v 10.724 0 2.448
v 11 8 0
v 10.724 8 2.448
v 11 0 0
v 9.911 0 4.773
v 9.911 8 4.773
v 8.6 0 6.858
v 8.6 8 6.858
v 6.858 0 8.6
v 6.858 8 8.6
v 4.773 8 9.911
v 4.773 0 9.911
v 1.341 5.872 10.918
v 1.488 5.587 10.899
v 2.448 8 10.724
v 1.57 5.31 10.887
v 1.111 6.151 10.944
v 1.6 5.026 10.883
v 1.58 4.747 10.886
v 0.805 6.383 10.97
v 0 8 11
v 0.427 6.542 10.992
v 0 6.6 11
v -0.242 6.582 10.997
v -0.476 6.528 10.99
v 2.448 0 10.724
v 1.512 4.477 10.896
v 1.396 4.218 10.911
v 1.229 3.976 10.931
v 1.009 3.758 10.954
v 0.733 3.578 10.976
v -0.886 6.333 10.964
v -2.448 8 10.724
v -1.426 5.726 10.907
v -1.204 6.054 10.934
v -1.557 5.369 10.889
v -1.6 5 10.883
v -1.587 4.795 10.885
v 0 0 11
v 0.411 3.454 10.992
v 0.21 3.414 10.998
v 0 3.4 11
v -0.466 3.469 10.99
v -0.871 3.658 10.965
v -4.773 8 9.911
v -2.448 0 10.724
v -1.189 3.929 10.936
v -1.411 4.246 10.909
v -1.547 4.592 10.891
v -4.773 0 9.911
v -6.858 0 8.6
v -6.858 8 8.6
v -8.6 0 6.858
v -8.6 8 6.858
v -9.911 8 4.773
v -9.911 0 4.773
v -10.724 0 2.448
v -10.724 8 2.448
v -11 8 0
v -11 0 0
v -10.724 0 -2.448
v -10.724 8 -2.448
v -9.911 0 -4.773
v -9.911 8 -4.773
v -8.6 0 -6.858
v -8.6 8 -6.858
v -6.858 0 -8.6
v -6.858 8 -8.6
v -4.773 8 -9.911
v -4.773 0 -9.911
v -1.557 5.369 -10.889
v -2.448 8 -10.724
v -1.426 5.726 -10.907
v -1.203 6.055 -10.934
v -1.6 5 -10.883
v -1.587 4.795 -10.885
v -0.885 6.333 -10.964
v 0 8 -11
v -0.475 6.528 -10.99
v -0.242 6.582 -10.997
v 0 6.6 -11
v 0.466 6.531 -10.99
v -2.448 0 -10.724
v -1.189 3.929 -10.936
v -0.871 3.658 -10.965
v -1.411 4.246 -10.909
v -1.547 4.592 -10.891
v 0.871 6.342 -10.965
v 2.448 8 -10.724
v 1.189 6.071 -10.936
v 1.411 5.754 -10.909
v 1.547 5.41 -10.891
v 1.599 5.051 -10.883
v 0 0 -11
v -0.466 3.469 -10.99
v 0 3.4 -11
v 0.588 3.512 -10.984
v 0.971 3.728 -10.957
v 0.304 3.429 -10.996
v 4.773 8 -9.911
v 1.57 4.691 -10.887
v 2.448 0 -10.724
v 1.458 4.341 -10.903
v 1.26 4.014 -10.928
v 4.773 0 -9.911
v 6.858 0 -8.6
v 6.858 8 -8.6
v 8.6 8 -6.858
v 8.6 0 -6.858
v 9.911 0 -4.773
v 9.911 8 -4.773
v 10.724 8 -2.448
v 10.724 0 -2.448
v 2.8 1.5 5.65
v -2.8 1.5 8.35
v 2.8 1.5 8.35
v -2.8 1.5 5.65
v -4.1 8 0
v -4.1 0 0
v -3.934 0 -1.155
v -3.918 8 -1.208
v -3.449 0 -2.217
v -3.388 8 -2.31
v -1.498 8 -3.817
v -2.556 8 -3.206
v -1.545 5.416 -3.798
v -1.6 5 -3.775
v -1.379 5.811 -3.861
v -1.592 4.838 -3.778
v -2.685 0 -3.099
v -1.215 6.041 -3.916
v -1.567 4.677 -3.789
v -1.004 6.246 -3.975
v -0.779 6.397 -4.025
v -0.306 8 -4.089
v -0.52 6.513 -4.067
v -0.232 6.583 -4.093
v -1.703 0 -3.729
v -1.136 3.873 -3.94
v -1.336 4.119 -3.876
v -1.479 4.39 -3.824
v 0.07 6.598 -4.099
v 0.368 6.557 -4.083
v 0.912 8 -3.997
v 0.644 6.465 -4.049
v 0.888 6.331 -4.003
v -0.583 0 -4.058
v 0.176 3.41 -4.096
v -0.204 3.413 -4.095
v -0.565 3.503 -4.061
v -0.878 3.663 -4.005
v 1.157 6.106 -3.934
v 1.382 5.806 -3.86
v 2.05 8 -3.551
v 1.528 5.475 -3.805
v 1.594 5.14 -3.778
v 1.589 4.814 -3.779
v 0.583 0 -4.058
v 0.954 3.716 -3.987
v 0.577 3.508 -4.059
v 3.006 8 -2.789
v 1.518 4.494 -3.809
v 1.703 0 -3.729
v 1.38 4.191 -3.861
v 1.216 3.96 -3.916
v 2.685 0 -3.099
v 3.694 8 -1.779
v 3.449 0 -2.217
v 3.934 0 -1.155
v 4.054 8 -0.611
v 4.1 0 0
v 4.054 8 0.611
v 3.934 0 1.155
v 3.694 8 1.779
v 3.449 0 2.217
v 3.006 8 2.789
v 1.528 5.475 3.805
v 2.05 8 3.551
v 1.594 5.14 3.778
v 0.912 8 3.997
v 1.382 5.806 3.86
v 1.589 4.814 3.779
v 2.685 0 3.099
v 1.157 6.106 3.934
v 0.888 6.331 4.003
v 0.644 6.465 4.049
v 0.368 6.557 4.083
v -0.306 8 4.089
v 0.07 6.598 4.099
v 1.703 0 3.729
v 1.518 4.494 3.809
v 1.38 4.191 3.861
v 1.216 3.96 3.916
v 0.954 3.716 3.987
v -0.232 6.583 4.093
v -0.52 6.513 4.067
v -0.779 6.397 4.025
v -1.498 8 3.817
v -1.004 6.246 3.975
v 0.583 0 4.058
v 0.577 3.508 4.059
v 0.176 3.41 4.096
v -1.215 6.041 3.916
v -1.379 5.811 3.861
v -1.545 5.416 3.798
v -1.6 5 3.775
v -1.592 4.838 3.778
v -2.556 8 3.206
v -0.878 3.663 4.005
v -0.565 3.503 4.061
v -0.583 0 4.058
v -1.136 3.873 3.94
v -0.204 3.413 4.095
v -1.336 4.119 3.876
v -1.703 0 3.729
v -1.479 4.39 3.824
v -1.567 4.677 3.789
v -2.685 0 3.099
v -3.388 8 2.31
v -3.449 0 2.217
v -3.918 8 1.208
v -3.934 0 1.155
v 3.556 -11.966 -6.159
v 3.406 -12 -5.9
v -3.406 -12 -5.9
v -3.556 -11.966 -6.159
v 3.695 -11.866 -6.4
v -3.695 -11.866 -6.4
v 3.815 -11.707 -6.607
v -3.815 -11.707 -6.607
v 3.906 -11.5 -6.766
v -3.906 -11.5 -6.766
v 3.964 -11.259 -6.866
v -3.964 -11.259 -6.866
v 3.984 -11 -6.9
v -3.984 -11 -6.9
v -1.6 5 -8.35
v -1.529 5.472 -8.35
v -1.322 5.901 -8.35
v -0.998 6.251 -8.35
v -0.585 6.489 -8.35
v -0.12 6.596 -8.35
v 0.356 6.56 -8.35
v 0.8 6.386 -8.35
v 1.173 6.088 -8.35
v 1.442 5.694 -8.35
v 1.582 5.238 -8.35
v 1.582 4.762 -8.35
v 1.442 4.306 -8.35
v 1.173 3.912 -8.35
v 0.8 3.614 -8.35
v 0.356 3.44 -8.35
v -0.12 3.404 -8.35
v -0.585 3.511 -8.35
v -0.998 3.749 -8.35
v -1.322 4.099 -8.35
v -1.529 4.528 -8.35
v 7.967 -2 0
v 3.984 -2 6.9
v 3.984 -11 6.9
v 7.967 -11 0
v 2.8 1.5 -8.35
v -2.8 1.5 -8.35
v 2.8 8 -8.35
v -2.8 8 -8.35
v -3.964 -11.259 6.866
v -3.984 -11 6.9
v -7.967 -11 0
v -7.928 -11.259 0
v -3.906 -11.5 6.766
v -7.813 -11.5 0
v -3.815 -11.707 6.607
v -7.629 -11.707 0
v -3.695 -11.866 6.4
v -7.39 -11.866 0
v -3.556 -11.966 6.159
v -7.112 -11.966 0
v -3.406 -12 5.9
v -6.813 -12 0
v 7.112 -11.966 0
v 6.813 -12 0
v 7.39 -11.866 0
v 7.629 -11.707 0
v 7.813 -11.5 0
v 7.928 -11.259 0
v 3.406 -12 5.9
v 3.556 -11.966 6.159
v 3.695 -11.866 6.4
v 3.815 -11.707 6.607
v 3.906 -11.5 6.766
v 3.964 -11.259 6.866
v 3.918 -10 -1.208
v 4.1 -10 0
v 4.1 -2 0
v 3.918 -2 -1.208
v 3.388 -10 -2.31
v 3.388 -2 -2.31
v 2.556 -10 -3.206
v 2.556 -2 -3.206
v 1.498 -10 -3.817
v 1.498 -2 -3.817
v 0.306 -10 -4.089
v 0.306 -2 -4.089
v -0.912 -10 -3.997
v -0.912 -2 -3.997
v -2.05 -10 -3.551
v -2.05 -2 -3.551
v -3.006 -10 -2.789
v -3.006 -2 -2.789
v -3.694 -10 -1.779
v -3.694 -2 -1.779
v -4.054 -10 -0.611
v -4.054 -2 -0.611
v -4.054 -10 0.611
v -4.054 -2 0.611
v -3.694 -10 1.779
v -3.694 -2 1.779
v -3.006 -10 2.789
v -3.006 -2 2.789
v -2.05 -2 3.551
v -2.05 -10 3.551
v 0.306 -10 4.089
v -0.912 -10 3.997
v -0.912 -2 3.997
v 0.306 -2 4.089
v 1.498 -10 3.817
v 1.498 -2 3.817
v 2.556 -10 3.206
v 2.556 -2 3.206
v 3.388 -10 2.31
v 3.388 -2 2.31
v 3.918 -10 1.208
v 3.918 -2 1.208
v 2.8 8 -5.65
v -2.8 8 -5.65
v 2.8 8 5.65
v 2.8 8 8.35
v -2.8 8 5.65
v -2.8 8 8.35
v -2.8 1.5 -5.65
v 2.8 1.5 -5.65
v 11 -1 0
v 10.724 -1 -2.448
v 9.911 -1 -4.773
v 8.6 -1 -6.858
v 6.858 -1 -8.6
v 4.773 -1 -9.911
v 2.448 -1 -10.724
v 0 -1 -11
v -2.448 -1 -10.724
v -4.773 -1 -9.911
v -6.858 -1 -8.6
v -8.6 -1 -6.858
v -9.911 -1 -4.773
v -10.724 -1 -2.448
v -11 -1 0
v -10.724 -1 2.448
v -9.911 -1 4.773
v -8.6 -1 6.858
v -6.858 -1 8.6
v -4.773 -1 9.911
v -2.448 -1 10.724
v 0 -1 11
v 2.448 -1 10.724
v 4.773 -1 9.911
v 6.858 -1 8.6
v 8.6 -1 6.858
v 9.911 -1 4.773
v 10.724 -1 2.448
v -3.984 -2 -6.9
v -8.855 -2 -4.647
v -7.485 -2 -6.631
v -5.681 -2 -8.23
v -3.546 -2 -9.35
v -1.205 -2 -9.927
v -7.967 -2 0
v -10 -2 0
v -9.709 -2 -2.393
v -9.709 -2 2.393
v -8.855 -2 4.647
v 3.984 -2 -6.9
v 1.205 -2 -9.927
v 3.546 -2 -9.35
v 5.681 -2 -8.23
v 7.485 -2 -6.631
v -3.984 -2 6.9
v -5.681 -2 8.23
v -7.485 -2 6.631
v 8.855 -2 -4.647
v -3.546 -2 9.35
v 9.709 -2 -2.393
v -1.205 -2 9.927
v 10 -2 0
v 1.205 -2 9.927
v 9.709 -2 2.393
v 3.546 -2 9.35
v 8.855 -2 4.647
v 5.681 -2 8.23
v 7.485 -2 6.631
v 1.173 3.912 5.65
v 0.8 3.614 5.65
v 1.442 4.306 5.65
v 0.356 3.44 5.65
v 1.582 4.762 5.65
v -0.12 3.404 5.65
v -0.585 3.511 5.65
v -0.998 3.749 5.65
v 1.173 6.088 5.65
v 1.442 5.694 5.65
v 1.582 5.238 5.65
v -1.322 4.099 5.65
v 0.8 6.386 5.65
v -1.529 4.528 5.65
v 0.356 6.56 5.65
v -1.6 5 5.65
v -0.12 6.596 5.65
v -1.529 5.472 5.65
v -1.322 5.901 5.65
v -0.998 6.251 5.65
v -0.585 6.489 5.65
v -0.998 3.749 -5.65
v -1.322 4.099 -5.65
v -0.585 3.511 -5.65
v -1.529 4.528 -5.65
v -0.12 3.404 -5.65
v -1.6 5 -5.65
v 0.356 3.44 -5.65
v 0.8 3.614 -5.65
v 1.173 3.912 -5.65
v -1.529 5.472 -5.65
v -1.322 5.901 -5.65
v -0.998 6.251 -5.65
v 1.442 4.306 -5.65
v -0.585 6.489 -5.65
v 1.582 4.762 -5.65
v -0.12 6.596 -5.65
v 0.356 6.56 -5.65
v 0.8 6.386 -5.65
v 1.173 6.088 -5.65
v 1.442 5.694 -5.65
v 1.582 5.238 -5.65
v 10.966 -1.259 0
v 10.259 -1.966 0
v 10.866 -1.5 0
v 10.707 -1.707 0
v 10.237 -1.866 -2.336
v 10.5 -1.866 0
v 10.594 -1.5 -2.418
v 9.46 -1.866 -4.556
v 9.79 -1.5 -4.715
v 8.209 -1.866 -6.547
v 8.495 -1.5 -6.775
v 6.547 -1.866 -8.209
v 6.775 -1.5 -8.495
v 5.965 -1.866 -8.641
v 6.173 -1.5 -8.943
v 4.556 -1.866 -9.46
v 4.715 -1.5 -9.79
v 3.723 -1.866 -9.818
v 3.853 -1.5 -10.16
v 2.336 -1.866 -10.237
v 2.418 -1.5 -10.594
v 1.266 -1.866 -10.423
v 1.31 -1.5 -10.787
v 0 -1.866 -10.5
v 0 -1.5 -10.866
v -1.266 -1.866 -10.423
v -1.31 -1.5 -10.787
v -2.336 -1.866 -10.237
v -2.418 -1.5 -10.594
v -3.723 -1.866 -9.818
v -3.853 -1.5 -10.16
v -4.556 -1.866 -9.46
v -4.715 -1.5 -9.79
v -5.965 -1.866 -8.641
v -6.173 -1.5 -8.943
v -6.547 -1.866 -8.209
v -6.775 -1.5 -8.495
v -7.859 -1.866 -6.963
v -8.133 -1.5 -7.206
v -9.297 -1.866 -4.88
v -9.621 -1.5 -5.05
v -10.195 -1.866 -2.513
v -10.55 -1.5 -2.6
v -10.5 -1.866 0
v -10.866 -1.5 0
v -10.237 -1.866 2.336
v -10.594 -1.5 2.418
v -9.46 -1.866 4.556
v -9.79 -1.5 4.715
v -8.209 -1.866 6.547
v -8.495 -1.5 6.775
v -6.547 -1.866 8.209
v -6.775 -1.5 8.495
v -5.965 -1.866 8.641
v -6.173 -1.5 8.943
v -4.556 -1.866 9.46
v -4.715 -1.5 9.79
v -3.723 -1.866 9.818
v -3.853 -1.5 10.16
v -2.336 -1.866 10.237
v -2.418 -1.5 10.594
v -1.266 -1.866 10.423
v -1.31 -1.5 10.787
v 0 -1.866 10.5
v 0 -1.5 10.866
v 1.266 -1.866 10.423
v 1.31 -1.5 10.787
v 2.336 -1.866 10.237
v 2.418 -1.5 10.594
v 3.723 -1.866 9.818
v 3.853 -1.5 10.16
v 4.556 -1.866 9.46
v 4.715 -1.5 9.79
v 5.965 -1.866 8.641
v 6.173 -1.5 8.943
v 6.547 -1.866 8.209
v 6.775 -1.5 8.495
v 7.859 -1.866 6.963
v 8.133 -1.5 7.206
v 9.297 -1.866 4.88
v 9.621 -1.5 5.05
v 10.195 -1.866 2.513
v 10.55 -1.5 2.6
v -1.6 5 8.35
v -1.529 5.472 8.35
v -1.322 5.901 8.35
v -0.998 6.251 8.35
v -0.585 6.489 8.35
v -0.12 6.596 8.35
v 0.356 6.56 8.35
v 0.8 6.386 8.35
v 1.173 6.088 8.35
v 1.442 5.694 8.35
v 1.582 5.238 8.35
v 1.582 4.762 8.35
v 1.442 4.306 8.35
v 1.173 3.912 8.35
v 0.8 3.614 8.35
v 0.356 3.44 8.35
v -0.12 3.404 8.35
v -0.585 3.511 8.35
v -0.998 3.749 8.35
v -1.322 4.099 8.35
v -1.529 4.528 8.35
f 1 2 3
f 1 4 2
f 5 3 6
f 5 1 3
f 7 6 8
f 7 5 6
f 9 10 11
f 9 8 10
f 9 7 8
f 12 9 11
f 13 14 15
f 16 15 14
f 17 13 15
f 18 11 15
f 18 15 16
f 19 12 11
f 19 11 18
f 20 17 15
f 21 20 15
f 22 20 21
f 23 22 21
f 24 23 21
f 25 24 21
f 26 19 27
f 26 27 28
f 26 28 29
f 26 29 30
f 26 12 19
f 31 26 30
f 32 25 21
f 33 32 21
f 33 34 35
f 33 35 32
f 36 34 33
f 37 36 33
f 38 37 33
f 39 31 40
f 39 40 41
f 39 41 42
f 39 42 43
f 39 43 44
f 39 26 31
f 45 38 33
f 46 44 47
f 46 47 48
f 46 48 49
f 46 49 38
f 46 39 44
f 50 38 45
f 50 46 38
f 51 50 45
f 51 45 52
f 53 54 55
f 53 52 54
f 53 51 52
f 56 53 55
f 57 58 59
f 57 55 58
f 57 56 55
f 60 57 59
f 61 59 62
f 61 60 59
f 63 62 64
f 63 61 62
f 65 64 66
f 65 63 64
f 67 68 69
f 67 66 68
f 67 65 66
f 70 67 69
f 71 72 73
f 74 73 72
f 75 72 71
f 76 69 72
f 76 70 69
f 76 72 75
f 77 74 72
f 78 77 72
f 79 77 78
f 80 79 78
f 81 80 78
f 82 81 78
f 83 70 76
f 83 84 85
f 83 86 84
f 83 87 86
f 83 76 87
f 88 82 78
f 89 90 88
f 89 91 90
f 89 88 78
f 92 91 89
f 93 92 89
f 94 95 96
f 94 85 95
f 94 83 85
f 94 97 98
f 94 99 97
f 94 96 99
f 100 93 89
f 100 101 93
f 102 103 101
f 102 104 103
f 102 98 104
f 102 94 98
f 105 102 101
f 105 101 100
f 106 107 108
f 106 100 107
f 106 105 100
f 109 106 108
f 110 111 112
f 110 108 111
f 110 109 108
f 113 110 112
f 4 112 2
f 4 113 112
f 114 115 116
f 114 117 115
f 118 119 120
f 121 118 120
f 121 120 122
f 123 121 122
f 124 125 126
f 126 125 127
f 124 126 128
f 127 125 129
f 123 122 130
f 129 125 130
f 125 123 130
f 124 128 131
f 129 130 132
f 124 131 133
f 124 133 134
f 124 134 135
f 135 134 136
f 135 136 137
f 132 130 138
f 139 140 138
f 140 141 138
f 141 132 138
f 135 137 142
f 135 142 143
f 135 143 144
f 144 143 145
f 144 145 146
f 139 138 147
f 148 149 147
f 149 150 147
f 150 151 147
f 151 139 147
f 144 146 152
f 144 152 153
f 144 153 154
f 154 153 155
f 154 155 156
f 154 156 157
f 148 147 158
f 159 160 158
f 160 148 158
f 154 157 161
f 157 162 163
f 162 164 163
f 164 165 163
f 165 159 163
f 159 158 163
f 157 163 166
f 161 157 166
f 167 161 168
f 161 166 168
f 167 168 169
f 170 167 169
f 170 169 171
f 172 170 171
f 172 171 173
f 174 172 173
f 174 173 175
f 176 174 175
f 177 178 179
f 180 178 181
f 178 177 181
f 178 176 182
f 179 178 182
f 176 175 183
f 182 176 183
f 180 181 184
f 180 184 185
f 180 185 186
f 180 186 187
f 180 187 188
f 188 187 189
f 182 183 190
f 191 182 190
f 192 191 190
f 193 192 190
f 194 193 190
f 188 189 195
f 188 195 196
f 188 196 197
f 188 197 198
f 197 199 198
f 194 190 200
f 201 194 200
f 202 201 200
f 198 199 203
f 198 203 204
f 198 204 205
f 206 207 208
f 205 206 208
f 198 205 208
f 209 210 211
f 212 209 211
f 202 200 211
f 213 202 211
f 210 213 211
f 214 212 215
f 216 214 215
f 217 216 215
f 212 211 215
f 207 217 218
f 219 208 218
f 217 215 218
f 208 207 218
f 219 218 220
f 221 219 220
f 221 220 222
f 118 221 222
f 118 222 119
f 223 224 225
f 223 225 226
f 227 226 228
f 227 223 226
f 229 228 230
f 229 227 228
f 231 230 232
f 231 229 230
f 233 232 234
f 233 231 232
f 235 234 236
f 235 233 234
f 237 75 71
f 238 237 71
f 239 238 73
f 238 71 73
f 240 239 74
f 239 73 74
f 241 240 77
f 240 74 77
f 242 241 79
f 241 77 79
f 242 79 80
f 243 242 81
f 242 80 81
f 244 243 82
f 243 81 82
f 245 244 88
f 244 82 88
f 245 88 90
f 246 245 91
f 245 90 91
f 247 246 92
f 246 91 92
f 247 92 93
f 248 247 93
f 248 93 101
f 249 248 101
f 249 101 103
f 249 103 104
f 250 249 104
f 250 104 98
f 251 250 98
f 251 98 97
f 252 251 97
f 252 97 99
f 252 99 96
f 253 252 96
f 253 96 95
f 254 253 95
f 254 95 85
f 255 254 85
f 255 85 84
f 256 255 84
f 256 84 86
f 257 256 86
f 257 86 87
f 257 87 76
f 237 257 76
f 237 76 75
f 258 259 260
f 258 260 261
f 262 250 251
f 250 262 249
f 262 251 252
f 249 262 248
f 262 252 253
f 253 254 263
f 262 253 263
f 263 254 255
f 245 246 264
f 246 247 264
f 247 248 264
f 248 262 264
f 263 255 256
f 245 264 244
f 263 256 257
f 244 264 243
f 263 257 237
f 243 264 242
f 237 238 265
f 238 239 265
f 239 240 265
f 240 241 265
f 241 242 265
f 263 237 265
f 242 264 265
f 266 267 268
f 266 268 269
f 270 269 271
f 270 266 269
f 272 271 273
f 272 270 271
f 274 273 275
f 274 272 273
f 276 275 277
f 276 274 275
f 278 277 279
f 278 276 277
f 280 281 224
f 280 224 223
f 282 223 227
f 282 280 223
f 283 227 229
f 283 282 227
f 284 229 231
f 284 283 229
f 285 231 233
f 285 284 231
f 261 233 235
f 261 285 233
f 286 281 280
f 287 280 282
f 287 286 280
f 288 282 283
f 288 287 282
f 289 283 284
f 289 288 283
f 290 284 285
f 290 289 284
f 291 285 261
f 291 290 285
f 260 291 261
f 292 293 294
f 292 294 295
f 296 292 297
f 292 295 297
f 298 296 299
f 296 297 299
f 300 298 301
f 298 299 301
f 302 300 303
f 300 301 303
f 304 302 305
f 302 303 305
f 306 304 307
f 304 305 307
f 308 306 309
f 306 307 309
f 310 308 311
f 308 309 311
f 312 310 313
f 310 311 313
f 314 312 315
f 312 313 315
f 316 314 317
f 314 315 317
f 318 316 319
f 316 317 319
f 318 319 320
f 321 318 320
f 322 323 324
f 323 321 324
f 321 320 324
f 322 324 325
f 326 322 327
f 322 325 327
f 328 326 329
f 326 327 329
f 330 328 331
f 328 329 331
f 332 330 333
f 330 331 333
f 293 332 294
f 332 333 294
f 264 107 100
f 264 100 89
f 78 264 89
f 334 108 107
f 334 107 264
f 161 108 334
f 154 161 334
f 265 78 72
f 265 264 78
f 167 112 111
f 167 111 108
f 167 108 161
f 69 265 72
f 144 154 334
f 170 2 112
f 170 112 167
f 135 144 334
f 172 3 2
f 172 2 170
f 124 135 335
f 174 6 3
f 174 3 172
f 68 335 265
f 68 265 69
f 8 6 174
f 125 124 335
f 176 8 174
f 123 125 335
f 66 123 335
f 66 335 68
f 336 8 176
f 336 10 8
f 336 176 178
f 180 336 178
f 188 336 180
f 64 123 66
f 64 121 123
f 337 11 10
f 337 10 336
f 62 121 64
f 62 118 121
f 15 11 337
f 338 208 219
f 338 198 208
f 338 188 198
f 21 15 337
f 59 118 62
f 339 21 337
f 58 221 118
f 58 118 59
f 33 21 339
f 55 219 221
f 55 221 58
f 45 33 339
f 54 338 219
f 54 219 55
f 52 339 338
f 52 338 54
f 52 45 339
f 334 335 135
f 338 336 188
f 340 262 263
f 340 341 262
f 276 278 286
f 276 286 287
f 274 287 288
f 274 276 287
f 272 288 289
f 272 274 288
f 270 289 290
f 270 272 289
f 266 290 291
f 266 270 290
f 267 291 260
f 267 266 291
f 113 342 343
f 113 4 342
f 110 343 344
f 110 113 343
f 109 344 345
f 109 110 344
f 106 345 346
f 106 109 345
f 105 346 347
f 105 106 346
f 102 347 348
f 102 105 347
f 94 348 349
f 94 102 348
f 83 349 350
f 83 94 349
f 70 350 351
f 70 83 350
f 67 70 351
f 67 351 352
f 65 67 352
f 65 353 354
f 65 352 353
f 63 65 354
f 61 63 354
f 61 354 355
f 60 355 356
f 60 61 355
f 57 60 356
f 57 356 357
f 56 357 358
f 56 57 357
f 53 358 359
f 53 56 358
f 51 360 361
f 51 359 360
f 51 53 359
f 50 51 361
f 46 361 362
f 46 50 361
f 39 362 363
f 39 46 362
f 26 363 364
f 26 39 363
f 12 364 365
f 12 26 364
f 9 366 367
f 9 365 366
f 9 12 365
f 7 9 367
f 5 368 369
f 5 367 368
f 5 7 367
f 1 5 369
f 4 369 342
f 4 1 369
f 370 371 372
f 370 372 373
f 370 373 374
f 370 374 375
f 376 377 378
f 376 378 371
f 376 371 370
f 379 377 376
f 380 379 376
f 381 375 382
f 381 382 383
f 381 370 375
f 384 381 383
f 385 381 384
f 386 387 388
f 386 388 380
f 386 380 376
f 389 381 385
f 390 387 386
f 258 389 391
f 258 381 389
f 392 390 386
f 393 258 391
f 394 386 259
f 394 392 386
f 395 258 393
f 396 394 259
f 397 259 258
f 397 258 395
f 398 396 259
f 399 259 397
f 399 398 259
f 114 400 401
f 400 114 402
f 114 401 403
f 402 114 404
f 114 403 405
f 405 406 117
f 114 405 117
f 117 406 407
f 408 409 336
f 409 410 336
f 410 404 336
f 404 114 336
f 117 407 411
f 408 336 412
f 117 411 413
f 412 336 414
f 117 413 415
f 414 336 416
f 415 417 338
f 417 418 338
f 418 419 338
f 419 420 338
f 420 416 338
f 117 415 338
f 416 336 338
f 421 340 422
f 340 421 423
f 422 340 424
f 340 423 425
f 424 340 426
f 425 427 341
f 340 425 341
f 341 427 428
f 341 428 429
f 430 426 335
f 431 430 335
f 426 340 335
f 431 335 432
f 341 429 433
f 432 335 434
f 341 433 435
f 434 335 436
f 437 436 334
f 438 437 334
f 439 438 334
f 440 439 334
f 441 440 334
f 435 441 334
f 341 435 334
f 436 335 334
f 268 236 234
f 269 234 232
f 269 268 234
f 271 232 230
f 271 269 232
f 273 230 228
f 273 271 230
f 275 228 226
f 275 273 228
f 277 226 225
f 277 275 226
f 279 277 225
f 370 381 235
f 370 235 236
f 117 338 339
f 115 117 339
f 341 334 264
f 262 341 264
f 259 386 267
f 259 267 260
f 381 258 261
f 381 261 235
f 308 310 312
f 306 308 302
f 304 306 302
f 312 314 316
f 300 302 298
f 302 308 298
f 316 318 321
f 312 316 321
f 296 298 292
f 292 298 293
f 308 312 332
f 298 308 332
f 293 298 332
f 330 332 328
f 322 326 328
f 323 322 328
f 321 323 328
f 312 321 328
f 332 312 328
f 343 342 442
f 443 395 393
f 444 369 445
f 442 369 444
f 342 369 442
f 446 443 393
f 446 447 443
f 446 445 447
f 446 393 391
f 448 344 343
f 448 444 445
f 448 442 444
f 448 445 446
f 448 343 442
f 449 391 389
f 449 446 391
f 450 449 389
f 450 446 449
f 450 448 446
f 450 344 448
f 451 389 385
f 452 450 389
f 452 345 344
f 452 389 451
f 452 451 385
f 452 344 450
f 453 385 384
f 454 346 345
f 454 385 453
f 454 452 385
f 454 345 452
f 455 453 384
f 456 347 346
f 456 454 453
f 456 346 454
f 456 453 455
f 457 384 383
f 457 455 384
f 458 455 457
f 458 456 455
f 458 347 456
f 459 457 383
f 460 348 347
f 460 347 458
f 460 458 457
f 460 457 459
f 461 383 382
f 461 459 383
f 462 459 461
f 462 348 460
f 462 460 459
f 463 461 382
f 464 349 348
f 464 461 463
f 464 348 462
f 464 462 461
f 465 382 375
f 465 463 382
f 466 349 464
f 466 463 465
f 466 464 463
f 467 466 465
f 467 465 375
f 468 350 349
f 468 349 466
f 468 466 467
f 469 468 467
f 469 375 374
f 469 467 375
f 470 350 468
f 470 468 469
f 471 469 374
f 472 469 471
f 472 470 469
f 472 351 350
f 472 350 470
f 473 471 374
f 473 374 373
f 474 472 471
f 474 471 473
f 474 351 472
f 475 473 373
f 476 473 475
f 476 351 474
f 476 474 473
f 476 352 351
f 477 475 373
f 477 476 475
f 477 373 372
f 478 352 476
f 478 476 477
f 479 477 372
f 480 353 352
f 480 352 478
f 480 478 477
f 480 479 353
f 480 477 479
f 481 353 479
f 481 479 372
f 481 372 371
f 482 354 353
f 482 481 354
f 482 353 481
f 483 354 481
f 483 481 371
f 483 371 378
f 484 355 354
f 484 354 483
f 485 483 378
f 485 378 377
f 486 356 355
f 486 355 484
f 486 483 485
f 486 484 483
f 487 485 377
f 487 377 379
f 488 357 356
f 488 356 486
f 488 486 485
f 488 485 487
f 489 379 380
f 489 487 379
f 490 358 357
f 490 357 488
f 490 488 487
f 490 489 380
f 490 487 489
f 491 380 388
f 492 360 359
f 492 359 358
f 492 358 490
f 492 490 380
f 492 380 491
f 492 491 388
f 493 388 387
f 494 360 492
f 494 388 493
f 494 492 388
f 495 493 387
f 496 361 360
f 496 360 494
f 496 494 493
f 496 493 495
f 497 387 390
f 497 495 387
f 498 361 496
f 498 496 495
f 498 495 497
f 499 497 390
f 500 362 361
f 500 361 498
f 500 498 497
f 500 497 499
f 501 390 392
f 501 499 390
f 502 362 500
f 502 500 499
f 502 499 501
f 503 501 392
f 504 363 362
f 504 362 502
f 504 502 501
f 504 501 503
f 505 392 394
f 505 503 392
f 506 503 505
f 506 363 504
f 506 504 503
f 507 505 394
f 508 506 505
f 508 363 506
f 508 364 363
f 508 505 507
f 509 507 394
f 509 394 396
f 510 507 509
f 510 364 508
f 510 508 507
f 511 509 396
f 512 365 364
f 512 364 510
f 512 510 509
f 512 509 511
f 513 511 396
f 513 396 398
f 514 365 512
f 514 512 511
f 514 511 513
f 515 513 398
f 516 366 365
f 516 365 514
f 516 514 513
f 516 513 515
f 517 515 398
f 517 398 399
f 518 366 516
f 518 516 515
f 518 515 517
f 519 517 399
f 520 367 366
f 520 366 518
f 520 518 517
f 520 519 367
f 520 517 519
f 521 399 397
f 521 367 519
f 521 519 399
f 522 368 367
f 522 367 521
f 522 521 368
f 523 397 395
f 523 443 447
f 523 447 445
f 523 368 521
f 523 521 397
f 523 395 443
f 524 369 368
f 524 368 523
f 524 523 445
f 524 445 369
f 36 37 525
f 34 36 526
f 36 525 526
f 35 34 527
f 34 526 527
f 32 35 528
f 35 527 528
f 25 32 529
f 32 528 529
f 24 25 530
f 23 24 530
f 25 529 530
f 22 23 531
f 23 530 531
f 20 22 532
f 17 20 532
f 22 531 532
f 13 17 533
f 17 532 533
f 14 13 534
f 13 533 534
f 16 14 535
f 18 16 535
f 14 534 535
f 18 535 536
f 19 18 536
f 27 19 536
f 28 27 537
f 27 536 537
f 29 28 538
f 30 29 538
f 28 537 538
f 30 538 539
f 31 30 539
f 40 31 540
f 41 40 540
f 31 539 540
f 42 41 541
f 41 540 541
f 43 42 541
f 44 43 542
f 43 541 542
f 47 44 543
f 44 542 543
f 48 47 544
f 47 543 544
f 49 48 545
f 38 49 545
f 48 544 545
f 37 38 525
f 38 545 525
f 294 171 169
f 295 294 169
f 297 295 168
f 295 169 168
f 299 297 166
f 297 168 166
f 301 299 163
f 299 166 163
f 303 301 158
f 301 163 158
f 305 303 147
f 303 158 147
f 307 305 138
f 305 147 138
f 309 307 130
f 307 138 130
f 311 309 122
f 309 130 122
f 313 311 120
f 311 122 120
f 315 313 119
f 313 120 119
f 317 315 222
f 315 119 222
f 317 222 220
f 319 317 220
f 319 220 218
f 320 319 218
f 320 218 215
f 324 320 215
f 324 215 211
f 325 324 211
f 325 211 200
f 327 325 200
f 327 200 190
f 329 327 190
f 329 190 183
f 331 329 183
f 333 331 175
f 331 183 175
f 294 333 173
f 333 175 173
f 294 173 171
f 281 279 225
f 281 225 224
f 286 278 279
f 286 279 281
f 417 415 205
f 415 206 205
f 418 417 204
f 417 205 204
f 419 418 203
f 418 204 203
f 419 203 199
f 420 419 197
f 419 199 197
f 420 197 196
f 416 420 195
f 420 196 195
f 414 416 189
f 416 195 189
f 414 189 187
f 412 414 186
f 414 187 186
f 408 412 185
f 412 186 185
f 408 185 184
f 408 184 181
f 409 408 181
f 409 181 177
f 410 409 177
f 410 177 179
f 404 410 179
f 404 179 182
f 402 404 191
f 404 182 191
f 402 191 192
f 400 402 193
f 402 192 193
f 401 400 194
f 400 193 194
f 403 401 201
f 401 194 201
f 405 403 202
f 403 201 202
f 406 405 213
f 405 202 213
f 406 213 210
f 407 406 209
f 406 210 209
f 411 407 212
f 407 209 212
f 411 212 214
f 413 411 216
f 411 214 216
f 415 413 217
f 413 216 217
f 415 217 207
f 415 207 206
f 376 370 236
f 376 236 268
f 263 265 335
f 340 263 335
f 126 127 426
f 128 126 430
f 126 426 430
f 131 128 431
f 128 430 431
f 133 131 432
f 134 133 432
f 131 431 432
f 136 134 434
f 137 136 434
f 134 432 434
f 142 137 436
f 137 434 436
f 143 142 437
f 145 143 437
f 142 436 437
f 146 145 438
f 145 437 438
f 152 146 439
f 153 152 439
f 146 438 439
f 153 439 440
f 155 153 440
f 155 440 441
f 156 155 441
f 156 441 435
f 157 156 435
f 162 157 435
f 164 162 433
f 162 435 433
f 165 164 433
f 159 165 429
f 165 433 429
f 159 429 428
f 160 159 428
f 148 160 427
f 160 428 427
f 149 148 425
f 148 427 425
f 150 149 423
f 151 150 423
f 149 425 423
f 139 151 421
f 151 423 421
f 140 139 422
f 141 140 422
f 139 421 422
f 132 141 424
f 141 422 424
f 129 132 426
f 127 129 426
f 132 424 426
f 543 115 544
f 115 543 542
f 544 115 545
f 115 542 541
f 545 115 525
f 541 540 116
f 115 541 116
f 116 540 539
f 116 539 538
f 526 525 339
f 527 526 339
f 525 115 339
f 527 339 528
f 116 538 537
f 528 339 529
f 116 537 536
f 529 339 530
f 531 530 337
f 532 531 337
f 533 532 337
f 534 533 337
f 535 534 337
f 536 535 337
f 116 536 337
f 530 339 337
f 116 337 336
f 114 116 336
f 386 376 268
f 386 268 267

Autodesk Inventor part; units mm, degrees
ref_plane "YZ Plane" through (0, 0, 0) normal (1, 0, 0) x (0, 1, 0)
ref_plane "XZ Plane" through (0, 0, 0) normal (0, 1, 0) x (-1, 0, 0)
ref_plane "XY Plane" through (0, 0, 0) normal (0, 0, 1) x (1, 0, 0)
sketch "Sketch1" plane through (0, 0, 0) normal (0, 1, 0) x (-1, 0, 0)
  line L0 (12.7017, 0) -> (6.3509, -11)
  line L1 (6.3509, -11) -> (-6.3509, -11)
  line L2 (-6.3509, -11) -> (-12.7017, 0)
  line L3 (-12.7017, 0) -> (-6.3509, 11)
  line L4 (-6.3509, 11) -> (6.3509, 11)
  line L5 (6.3509, 11) -> (12.7017, 0)
  circle A0 centre (0, 0) radius 11
  circle A1 centre (0, 0) radius 4.1
  dimension "d0" = 22
  dimension "d1" = 8.2
extrude "Extrusion1" add sketch "Sketch1" along normal blind 8
sketch "Sketch2" plane through (0, 8, 0) normal (0, 1, 0) x (1, 0, 0)
  line L0 (-2.8, -8.35) -> (2.8, -8.35)
  line L1 (2.8, -8.35) -> (2.8, -5.65)
  line L2 (2.8, -5.65) -> (-2.8, -5.65)
  line L3 (-2.8, -5.65) -> (-2.8, -8.35)
  line L4 (-2.8, -8.35) -> (2.8, -5.65) construction
  line L5 (2.8, -8.35) -> (-2.8, -5.65) construction
  point P0 (0, 0)
  point P1 (0, -7)
  point P2 (0, -7)
  dimension "d4" = 2.7
  dimension "d5" = 5.6
  dimension "d8" = 7
extrude "Extrusion2" cut sketch "Sketch2" against normal blind 6.5
mirror "Mirror1" about plane through (0, 0, 0) normal (0, 0, 1) of "Extrusion2"
sketch "Sketch3" plane through (6.3509, 0, -11) normal (0, 0, -1) x (-1, 0, 0)
  circle A0 centre (6.3509, 5) radius 1.6
  line L0 (0, 0) -> (12.7017, 0) projected
  point P0 (6.3509, 0)
  point P1 (6.3509, 0)
  dimension "d9" = 3.2
  dimension "d10" = 5
extrude "Extrusion3" cut sketch "Sketch3" against normal through all
sketch "Sketch5" plane through (0, 0, 0) normal (0, -1, 0) x (1, 0, 0)
  circle A0 centre (0, 0) radius 11
  line L0 (6.3509, -11) -> (-6.3509, -11) projected
  circle A1 centre (0, 0) radius 14.2349
extrude "Extrusion5" cut sketch "Sketch5" against normal through all
sketch "Sketch6" plane through (0, 0, 0) normal (0, -1, 0) x (1, 0, 0)
  circle A0 centre (0, 0) radius 11 projected
  circle A1 centre (0, 0) radius 4.1 projected
extrude "Extrusion6" add sketch "Sketch6" along normal blind 2
sketch "Sketch7" plane through (0, -2, 0) normal (0, -1, 0) x (1, 0, 0)
  line L0 (-7.9674, 0) -> (-3.9837, 6.9)
  line L1 (-3.9837, 6.9) -> (3.9837, 6.9)
  line L2 (3.9837, 6.9) -> (7.9674, 0)
  line L3 (7.9674, 0) -> (3.9837, -6.9)
  line L4 (3.9837, -6.9) -> (-3.9837, -6.9)
  line L5 (-3.9837, -6.9) -> (-7.9674, 0)
  circle A0 centre (0, 0) radius 6.9
  circle A1 centre (0, 0) radius 4.1 projected
  dimension "d19" = 13.8
extrude "Extrusion7" add sketch "Sketch7" along normal blind 10
sketch "Sketch8" plane through (0, -12, 0) normal (0, -1, 0) x (1, 0, 0)
  circle A0 centre (0, 0) radius 4.1
extrude "Extrusion8" add sketch "Sketch8" against normal blind 2
fillet "Fillet1" radius 1 6 edges at (0, -12, -6.9) (-5.9756, -12, -3.45) (-5.9756, -12, 3.45) (0, -12, 6.9) (5.9756, -12, 3.45) (5.9756, -12, -3.45)
fillet "Fillet2" radius 1 1 edges at (-11, -2, 0)
sketch "Sketch4" plane through (0, 0, 0) normal (0, -1, 0) x (1, 0, 0)
  line L0 (-2.8, -5.25) -> (2.8, -5.25) projected
  line L1 (2.8, -5.25) -> (2.8, -7.95) projected
  line L2 (2.8, -7.95) -> (-2.8, -7.95) projected
  line L3 (-2.8, -7.95) -> (-2.8, -5.25) projected
  line L4 (2.8, 5.25) -> (-2.8, 5.25) projected
  line L5 (-2.8, 5.25) -> (-2.8, 7.95) projected
  line L6 (-2.8, 7.95) -> (2.8, 7.95) projected
  line L7 (2.8, 7.95) -> (2.8, 5.25) projected
  line L8 (5.4848, -9.5) -> (-5.4848, -9.5) projected
  line L9 (10.9697, 0) -> (5.4848, -9.5) projected
  line L10 (5.4848, 9.5) -> (10.9697, 0) projected
  line L11 (-5.4848, 9.5) -> (5.4848, 9.5) projected
  line L12 (-10.9697, 0) -> (-5.4848, 9.5) projected
  line L13 (-5.4848, -9.5) -> (-10.9697, 0) projected
  circle A0 centre (0, 0) radius 4.1 projected
properties part number "EndNut"
